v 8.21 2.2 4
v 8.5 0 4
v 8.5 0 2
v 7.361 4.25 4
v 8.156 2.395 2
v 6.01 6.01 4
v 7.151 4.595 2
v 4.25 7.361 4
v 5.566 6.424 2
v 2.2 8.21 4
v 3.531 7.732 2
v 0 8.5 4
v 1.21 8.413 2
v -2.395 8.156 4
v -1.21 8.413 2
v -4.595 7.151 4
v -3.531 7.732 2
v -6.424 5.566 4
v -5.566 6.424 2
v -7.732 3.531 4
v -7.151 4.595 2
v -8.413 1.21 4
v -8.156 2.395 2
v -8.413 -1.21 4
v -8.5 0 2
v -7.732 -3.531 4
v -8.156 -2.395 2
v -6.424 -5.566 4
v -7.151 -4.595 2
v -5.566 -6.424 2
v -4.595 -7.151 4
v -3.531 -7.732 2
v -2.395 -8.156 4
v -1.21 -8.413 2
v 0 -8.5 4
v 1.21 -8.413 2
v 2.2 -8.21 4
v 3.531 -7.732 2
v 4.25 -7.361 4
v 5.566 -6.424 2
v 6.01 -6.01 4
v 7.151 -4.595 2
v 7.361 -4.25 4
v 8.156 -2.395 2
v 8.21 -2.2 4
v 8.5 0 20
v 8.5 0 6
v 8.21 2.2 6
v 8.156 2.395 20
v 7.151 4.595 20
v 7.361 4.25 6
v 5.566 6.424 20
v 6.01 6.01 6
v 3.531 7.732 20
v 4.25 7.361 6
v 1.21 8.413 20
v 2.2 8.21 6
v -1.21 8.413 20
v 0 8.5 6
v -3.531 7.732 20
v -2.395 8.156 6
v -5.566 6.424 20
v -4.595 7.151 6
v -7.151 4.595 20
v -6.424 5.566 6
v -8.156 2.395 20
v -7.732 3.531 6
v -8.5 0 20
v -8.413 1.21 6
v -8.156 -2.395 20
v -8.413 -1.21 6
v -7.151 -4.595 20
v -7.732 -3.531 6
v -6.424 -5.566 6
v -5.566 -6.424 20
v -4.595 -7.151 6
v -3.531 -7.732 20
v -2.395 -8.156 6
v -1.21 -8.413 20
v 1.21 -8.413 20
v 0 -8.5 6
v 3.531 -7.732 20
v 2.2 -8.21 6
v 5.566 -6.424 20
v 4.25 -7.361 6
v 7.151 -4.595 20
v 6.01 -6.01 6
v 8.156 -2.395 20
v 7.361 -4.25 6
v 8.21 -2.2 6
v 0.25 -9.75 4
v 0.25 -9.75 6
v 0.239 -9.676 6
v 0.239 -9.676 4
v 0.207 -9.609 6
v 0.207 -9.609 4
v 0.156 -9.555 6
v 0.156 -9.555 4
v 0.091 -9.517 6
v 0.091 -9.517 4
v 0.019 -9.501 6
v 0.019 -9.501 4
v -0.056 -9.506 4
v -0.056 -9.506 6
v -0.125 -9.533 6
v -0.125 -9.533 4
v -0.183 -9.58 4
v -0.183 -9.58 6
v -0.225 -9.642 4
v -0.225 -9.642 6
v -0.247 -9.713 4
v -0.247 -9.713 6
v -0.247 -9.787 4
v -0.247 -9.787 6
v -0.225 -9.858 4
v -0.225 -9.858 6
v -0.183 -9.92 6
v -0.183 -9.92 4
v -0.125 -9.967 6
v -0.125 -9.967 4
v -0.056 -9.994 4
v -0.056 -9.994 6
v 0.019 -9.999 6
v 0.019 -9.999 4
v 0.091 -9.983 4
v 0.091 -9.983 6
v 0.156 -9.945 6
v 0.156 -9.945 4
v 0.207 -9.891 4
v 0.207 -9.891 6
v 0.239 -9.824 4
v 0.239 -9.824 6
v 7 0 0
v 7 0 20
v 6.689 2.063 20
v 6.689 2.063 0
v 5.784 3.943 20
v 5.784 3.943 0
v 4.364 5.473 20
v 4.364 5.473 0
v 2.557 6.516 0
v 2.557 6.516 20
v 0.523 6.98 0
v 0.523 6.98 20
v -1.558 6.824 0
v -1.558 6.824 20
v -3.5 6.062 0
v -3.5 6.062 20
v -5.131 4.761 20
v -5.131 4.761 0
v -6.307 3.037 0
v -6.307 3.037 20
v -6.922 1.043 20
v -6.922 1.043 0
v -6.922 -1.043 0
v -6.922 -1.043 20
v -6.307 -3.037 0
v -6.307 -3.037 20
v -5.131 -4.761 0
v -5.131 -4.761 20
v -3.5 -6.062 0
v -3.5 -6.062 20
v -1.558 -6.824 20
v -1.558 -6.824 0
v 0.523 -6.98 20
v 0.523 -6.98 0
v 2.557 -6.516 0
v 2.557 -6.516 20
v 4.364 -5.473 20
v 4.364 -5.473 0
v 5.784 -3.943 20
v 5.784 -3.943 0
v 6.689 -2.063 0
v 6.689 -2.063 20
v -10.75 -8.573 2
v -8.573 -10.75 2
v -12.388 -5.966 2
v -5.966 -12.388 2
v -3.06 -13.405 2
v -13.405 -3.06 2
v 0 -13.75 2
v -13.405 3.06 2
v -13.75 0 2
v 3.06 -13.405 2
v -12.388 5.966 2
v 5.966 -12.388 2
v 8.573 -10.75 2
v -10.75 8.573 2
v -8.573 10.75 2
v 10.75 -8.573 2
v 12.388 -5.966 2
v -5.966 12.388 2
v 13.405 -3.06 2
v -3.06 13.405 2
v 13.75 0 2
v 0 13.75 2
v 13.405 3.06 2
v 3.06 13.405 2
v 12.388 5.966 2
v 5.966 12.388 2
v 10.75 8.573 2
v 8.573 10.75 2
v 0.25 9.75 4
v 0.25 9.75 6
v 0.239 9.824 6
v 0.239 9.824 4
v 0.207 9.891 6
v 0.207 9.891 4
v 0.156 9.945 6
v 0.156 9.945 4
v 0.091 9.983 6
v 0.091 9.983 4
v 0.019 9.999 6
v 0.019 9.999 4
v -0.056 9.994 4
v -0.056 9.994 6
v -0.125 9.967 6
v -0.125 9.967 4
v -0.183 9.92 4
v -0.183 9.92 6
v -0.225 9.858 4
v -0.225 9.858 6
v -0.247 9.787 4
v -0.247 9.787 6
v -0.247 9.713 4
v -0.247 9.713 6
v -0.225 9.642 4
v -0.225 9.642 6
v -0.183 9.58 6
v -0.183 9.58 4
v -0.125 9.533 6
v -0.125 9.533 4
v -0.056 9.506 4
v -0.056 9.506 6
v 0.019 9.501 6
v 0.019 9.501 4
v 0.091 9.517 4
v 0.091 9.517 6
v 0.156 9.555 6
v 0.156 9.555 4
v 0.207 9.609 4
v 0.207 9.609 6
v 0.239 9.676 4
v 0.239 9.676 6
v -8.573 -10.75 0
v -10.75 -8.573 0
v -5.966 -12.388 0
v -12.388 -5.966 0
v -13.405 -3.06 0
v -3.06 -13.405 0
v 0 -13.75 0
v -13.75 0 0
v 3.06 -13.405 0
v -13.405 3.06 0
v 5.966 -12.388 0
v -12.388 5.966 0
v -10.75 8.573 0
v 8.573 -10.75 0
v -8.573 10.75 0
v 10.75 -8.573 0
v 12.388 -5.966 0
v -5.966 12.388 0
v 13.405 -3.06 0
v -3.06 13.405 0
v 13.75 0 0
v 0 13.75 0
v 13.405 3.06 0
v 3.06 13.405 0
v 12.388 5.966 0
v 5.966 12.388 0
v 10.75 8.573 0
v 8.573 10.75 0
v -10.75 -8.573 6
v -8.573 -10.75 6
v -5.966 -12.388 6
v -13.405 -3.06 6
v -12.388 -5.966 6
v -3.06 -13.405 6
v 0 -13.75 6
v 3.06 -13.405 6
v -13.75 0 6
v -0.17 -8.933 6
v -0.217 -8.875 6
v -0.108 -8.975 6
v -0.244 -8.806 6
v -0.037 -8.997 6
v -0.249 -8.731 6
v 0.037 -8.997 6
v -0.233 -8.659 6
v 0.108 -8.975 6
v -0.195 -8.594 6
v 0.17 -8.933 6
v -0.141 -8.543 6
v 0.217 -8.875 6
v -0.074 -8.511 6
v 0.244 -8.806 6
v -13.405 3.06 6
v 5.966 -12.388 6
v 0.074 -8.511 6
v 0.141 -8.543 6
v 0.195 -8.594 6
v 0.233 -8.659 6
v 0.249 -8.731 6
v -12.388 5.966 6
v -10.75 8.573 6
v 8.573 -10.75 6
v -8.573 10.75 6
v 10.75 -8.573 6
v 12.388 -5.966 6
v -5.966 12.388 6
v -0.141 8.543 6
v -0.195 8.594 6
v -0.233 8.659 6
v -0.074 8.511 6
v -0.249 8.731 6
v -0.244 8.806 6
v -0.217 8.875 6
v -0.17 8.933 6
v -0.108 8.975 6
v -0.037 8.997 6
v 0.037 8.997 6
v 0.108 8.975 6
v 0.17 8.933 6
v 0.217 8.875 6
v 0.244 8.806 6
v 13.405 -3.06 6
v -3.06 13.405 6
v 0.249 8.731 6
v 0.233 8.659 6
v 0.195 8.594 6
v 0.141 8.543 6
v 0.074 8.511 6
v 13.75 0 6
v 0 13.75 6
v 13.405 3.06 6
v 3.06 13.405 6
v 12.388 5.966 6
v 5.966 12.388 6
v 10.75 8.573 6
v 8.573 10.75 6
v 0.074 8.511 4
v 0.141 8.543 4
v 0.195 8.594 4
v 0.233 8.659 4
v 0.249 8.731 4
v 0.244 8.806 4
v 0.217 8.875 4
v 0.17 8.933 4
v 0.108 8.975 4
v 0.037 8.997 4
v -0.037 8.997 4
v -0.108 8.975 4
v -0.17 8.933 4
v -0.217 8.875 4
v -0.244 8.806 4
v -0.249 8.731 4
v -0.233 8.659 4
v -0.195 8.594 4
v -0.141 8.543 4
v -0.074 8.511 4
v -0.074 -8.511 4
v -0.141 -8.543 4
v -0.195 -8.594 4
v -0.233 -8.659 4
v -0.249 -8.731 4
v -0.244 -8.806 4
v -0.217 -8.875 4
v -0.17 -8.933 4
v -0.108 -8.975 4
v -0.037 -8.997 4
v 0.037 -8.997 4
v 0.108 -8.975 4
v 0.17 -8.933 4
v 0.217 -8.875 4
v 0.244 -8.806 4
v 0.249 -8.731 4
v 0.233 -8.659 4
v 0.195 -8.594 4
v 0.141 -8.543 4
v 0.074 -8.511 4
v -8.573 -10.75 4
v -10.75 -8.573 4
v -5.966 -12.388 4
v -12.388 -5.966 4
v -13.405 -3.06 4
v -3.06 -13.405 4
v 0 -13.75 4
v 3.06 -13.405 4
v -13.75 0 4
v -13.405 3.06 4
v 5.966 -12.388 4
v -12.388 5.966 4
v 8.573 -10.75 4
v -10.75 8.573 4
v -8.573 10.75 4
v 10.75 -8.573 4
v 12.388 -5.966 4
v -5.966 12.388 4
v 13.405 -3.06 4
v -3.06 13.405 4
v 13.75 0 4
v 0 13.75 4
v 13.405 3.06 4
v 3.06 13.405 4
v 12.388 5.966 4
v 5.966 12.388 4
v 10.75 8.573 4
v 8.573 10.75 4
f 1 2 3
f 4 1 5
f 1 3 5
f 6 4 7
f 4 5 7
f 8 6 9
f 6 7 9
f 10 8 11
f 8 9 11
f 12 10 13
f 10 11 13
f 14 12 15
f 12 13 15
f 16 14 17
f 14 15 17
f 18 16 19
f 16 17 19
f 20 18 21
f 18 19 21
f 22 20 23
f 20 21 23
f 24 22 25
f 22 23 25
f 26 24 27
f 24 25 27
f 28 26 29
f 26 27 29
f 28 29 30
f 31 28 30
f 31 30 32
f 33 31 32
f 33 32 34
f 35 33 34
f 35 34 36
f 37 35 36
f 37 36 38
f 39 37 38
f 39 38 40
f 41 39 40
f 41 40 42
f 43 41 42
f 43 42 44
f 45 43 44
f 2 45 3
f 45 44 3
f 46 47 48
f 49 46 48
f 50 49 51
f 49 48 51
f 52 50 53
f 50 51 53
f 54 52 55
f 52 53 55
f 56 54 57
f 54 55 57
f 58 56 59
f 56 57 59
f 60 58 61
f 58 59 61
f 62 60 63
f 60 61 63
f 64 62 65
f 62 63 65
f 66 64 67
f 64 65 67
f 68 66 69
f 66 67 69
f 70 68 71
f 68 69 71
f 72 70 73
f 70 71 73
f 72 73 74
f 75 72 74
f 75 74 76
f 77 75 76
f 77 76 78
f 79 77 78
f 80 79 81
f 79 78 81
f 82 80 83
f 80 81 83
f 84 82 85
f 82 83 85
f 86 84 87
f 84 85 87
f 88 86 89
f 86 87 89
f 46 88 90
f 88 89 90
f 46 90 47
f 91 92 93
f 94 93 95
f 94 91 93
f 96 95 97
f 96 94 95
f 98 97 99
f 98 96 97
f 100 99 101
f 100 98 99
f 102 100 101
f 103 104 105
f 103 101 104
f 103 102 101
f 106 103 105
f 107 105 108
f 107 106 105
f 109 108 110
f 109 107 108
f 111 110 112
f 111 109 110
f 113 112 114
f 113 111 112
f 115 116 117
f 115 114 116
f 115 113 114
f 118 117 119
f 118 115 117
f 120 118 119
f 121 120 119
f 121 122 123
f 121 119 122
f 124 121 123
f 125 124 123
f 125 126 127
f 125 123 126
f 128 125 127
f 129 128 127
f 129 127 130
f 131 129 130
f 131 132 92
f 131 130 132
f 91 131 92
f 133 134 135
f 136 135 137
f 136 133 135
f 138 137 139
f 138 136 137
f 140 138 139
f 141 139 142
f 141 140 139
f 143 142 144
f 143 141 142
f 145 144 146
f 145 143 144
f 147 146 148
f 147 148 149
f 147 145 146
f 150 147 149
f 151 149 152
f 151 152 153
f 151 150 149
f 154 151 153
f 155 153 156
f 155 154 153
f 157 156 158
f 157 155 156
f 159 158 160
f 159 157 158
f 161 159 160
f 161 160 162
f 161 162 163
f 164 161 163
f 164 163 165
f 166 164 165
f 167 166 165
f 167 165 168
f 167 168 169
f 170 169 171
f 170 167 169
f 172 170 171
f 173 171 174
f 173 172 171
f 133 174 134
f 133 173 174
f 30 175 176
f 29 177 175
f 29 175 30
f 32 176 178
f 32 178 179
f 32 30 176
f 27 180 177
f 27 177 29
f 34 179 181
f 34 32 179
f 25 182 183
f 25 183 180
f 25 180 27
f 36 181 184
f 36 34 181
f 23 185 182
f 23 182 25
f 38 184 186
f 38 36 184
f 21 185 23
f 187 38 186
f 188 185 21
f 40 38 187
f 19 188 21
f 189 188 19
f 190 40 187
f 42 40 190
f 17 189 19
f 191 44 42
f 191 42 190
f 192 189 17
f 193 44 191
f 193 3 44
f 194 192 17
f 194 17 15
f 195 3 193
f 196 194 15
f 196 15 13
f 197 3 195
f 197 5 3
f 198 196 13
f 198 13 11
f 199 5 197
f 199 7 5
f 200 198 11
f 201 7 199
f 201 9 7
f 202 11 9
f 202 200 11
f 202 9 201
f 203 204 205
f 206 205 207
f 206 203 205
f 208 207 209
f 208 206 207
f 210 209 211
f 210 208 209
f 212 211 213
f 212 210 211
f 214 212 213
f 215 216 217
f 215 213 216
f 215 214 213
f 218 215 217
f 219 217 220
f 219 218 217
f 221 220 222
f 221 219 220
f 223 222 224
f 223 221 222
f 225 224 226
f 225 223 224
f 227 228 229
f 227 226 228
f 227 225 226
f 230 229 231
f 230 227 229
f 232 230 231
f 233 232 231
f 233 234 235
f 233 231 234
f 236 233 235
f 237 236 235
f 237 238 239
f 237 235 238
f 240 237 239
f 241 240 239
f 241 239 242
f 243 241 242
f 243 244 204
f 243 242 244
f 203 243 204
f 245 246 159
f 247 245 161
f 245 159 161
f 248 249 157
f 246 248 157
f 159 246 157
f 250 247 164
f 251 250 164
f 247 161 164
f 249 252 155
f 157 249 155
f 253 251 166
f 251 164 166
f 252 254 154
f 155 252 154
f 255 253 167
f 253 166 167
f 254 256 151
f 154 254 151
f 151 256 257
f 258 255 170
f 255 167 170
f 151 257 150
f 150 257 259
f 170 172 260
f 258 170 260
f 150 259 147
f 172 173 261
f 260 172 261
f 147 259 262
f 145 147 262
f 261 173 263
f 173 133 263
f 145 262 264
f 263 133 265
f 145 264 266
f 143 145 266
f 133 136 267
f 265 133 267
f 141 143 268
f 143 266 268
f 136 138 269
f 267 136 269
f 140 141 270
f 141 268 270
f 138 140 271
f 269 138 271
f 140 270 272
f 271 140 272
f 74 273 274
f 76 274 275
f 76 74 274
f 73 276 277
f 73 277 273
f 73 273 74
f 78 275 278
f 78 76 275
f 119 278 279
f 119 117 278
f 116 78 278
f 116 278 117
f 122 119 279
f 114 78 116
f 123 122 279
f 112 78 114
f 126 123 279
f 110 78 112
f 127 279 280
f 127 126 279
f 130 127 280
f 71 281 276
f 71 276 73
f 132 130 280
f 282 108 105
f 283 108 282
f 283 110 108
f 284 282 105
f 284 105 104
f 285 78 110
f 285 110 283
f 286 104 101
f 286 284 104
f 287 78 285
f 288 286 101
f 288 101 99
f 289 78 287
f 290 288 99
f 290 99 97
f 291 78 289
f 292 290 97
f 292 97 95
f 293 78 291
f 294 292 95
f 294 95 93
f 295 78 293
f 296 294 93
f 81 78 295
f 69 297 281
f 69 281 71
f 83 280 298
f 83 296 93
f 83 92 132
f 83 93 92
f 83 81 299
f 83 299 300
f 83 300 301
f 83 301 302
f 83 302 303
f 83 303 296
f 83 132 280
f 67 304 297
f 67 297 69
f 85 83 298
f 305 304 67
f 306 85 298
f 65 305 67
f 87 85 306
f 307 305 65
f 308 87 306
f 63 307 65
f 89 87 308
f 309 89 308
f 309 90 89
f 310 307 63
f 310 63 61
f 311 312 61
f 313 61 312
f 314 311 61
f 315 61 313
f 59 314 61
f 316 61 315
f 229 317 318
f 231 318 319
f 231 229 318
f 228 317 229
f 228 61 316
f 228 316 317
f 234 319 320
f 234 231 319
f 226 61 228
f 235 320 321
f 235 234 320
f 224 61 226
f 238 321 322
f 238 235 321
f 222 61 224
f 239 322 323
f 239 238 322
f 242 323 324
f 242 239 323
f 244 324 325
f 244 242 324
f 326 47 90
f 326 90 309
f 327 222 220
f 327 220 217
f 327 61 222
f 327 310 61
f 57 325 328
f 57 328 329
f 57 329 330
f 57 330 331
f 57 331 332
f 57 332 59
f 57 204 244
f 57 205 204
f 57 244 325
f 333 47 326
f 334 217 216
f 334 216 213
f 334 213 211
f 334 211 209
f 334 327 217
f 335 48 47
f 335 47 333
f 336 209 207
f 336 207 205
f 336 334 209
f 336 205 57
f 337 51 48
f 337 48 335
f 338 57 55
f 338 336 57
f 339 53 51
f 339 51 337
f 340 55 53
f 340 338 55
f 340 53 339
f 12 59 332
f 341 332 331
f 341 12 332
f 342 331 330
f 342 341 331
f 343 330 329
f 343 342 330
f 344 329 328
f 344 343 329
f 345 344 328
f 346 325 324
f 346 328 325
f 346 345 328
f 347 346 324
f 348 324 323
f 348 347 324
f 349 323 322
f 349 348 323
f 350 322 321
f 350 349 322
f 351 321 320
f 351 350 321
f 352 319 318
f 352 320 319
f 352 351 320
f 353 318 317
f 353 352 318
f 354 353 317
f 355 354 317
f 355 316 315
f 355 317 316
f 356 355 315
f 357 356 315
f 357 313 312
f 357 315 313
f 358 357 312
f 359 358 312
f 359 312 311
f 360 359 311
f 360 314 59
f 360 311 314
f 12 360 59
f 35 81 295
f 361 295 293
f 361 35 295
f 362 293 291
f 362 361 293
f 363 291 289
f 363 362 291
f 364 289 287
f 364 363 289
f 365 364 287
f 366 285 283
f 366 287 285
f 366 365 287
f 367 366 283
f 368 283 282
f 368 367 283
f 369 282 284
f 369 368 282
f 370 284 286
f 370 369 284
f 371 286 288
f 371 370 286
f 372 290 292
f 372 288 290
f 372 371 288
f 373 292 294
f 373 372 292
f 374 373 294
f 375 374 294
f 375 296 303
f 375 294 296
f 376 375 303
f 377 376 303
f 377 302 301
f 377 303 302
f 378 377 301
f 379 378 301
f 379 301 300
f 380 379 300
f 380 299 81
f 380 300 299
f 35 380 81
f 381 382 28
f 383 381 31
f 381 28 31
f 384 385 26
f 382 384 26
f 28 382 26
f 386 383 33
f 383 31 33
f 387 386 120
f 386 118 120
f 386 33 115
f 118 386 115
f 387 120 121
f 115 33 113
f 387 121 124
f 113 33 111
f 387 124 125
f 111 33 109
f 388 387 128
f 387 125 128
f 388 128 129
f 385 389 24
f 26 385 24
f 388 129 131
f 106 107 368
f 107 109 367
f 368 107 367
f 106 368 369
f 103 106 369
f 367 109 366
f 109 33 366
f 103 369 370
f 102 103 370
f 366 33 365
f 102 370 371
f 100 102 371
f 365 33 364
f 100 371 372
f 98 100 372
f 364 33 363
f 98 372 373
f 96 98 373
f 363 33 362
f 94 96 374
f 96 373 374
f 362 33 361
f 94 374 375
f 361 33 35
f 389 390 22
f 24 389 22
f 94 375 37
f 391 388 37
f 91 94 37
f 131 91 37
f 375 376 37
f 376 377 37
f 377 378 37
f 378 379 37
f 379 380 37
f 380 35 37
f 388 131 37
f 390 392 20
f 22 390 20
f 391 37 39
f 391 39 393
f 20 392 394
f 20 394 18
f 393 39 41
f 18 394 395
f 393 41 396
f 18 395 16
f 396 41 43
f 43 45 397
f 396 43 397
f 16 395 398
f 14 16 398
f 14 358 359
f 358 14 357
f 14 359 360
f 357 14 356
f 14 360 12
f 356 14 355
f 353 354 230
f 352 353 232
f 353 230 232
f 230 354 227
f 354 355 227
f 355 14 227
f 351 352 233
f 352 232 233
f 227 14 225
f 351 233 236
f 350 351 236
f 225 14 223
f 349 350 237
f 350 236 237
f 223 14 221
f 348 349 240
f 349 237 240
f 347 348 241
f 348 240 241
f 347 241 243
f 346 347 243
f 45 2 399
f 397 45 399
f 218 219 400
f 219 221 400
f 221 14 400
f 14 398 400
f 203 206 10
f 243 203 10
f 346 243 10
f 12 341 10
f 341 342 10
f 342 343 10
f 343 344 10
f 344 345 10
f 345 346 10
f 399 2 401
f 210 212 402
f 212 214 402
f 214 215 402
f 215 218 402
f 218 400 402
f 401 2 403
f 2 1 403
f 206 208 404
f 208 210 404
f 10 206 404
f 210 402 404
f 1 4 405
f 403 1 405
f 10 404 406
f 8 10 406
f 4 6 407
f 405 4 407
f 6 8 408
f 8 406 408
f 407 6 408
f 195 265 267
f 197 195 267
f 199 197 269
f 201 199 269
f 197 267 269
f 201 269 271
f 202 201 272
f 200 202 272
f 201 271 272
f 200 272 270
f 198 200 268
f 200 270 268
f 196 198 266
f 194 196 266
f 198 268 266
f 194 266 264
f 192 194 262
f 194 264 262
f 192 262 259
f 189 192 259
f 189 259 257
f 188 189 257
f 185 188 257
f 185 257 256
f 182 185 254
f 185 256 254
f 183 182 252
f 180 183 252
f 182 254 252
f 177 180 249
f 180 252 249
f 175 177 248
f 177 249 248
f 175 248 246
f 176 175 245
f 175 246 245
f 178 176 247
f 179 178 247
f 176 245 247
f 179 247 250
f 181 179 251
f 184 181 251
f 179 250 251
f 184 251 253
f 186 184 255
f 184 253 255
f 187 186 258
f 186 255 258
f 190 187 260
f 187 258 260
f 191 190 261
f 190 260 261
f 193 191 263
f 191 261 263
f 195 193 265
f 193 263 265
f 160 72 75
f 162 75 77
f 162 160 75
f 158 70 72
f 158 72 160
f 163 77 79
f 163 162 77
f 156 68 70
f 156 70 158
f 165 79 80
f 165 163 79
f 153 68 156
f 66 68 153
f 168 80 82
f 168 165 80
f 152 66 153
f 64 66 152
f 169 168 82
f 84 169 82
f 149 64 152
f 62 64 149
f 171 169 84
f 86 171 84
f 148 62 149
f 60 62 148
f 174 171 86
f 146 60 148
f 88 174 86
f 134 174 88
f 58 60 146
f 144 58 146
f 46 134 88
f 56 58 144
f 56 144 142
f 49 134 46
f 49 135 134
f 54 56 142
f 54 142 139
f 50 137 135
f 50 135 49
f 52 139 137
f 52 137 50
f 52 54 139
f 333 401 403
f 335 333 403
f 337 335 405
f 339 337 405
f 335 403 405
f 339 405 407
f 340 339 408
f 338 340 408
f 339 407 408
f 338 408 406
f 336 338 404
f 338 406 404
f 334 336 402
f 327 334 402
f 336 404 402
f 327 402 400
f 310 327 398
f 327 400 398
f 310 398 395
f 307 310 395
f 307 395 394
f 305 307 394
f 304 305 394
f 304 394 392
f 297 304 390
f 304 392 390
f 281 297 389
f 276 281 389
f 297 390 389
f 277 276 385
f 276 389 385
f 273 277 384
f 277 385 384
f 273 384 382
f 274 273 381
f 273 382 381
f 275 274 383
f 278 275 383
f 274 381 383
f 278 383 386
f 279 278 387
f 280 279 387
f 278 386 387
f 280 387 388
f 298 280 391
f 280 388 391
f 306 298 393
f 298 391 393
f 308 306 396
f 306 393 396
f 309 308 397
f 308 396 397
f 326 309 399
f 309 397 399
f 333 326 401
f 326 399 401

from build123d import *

# Parameters (mm, degrees)
SKETCH1_R           = 13.75
BOSS_EXTRUDE1_DEPTH = 2
SKETCH2_R           = 8.5
BOSS_EXTRUDE2_DEPTH = 6
BOSS_EXTRUDE3_START = 4
SKETCH3_R           = 13.75
BOSS_EXTRUDE3_DEPTH = 2
SKETCH5_R           = 7
CUT_EXTRUDE2_DEPTH  = 21.350061425
BOSS_EXTRUDE4_START = 6
SKETCH6_R           = 8.5
SKETCH6_R_2         = 7
BOSS_EXTRUDE4_DEPTH = 14
CUT_EXTRUDE3_START  = 4
SKETCH9_R           = 0.25
CUT_EXTRUDE3_DEPTH  = 24.894892006


with BuildPart() as part:
    # Sketch1 → Boss-Extrude1 (new body)
    with BuildSketch(Plane.XY):
        Circle(SKETCH1_R)
    extrude(amount=BOSS_EXTRUDE1_DEPTH)

    # Sketch2 → Boss-Extrude2 (add)
    with BuildSketch(Plane.XY):
        Circle(SKETCH2_R)
    extrude(amount=BOSS_EXTRUDE2_DEPTH)

    # Sketch3 → Boss-Extrude3 (add)
    with BuildSketch(Plane.XY.offset(BOSS_EXTRUDE3_START)):
        Circle(SKETCH3_R)
    extrude(amount=BOSS_EXTRUDE3_DEPTH)

    # Sketch5 → Cut-Extrude2 (cut, through all)
    with BuildSketch(Plane.XY):
        Circle(SKETCH5_R)
    extrude(amount=CUT_EXTRUDE2_DEPTH, mode=Mode.SUBTRACT)

    # Sketch6 → Boss-Extrude4 (add)
    with BuildSketch(Plane.XY.offset(BOSS_EXTRUDE4_START)):
        Circle(SKETCH6_R)
        Circle(SKETCH6_R_2, mode=Mode.SUBTRACT)
    extrude(amount=BOSS_EXTRUDE4_DEPTH)

    # Sketch9 → Cut-Extrude3 (cut, through all)
    with BuildSketch(Plane.XY.offset(CUT_EXTRUDE3_START)):
        with Locations((0, 9.75)):
            Circle(SKETCH9_R)
        with Locations((0, -9.75)):
            Circle(SKETCH9_R)
        with Locations(Location((0, 8.75, 0), (0, 0, 270.001597254))):
            Circle(SKETCH9_R)
        with Locations(Location((0, -8.75, 0), (0, 0, 90.001597254))):
            Circle(SKETCH9_R)
    extrude(amount=CUT_EXTRUDE3_DEPTH, mode=Mode.SUBTRACT)


solid = part.part
